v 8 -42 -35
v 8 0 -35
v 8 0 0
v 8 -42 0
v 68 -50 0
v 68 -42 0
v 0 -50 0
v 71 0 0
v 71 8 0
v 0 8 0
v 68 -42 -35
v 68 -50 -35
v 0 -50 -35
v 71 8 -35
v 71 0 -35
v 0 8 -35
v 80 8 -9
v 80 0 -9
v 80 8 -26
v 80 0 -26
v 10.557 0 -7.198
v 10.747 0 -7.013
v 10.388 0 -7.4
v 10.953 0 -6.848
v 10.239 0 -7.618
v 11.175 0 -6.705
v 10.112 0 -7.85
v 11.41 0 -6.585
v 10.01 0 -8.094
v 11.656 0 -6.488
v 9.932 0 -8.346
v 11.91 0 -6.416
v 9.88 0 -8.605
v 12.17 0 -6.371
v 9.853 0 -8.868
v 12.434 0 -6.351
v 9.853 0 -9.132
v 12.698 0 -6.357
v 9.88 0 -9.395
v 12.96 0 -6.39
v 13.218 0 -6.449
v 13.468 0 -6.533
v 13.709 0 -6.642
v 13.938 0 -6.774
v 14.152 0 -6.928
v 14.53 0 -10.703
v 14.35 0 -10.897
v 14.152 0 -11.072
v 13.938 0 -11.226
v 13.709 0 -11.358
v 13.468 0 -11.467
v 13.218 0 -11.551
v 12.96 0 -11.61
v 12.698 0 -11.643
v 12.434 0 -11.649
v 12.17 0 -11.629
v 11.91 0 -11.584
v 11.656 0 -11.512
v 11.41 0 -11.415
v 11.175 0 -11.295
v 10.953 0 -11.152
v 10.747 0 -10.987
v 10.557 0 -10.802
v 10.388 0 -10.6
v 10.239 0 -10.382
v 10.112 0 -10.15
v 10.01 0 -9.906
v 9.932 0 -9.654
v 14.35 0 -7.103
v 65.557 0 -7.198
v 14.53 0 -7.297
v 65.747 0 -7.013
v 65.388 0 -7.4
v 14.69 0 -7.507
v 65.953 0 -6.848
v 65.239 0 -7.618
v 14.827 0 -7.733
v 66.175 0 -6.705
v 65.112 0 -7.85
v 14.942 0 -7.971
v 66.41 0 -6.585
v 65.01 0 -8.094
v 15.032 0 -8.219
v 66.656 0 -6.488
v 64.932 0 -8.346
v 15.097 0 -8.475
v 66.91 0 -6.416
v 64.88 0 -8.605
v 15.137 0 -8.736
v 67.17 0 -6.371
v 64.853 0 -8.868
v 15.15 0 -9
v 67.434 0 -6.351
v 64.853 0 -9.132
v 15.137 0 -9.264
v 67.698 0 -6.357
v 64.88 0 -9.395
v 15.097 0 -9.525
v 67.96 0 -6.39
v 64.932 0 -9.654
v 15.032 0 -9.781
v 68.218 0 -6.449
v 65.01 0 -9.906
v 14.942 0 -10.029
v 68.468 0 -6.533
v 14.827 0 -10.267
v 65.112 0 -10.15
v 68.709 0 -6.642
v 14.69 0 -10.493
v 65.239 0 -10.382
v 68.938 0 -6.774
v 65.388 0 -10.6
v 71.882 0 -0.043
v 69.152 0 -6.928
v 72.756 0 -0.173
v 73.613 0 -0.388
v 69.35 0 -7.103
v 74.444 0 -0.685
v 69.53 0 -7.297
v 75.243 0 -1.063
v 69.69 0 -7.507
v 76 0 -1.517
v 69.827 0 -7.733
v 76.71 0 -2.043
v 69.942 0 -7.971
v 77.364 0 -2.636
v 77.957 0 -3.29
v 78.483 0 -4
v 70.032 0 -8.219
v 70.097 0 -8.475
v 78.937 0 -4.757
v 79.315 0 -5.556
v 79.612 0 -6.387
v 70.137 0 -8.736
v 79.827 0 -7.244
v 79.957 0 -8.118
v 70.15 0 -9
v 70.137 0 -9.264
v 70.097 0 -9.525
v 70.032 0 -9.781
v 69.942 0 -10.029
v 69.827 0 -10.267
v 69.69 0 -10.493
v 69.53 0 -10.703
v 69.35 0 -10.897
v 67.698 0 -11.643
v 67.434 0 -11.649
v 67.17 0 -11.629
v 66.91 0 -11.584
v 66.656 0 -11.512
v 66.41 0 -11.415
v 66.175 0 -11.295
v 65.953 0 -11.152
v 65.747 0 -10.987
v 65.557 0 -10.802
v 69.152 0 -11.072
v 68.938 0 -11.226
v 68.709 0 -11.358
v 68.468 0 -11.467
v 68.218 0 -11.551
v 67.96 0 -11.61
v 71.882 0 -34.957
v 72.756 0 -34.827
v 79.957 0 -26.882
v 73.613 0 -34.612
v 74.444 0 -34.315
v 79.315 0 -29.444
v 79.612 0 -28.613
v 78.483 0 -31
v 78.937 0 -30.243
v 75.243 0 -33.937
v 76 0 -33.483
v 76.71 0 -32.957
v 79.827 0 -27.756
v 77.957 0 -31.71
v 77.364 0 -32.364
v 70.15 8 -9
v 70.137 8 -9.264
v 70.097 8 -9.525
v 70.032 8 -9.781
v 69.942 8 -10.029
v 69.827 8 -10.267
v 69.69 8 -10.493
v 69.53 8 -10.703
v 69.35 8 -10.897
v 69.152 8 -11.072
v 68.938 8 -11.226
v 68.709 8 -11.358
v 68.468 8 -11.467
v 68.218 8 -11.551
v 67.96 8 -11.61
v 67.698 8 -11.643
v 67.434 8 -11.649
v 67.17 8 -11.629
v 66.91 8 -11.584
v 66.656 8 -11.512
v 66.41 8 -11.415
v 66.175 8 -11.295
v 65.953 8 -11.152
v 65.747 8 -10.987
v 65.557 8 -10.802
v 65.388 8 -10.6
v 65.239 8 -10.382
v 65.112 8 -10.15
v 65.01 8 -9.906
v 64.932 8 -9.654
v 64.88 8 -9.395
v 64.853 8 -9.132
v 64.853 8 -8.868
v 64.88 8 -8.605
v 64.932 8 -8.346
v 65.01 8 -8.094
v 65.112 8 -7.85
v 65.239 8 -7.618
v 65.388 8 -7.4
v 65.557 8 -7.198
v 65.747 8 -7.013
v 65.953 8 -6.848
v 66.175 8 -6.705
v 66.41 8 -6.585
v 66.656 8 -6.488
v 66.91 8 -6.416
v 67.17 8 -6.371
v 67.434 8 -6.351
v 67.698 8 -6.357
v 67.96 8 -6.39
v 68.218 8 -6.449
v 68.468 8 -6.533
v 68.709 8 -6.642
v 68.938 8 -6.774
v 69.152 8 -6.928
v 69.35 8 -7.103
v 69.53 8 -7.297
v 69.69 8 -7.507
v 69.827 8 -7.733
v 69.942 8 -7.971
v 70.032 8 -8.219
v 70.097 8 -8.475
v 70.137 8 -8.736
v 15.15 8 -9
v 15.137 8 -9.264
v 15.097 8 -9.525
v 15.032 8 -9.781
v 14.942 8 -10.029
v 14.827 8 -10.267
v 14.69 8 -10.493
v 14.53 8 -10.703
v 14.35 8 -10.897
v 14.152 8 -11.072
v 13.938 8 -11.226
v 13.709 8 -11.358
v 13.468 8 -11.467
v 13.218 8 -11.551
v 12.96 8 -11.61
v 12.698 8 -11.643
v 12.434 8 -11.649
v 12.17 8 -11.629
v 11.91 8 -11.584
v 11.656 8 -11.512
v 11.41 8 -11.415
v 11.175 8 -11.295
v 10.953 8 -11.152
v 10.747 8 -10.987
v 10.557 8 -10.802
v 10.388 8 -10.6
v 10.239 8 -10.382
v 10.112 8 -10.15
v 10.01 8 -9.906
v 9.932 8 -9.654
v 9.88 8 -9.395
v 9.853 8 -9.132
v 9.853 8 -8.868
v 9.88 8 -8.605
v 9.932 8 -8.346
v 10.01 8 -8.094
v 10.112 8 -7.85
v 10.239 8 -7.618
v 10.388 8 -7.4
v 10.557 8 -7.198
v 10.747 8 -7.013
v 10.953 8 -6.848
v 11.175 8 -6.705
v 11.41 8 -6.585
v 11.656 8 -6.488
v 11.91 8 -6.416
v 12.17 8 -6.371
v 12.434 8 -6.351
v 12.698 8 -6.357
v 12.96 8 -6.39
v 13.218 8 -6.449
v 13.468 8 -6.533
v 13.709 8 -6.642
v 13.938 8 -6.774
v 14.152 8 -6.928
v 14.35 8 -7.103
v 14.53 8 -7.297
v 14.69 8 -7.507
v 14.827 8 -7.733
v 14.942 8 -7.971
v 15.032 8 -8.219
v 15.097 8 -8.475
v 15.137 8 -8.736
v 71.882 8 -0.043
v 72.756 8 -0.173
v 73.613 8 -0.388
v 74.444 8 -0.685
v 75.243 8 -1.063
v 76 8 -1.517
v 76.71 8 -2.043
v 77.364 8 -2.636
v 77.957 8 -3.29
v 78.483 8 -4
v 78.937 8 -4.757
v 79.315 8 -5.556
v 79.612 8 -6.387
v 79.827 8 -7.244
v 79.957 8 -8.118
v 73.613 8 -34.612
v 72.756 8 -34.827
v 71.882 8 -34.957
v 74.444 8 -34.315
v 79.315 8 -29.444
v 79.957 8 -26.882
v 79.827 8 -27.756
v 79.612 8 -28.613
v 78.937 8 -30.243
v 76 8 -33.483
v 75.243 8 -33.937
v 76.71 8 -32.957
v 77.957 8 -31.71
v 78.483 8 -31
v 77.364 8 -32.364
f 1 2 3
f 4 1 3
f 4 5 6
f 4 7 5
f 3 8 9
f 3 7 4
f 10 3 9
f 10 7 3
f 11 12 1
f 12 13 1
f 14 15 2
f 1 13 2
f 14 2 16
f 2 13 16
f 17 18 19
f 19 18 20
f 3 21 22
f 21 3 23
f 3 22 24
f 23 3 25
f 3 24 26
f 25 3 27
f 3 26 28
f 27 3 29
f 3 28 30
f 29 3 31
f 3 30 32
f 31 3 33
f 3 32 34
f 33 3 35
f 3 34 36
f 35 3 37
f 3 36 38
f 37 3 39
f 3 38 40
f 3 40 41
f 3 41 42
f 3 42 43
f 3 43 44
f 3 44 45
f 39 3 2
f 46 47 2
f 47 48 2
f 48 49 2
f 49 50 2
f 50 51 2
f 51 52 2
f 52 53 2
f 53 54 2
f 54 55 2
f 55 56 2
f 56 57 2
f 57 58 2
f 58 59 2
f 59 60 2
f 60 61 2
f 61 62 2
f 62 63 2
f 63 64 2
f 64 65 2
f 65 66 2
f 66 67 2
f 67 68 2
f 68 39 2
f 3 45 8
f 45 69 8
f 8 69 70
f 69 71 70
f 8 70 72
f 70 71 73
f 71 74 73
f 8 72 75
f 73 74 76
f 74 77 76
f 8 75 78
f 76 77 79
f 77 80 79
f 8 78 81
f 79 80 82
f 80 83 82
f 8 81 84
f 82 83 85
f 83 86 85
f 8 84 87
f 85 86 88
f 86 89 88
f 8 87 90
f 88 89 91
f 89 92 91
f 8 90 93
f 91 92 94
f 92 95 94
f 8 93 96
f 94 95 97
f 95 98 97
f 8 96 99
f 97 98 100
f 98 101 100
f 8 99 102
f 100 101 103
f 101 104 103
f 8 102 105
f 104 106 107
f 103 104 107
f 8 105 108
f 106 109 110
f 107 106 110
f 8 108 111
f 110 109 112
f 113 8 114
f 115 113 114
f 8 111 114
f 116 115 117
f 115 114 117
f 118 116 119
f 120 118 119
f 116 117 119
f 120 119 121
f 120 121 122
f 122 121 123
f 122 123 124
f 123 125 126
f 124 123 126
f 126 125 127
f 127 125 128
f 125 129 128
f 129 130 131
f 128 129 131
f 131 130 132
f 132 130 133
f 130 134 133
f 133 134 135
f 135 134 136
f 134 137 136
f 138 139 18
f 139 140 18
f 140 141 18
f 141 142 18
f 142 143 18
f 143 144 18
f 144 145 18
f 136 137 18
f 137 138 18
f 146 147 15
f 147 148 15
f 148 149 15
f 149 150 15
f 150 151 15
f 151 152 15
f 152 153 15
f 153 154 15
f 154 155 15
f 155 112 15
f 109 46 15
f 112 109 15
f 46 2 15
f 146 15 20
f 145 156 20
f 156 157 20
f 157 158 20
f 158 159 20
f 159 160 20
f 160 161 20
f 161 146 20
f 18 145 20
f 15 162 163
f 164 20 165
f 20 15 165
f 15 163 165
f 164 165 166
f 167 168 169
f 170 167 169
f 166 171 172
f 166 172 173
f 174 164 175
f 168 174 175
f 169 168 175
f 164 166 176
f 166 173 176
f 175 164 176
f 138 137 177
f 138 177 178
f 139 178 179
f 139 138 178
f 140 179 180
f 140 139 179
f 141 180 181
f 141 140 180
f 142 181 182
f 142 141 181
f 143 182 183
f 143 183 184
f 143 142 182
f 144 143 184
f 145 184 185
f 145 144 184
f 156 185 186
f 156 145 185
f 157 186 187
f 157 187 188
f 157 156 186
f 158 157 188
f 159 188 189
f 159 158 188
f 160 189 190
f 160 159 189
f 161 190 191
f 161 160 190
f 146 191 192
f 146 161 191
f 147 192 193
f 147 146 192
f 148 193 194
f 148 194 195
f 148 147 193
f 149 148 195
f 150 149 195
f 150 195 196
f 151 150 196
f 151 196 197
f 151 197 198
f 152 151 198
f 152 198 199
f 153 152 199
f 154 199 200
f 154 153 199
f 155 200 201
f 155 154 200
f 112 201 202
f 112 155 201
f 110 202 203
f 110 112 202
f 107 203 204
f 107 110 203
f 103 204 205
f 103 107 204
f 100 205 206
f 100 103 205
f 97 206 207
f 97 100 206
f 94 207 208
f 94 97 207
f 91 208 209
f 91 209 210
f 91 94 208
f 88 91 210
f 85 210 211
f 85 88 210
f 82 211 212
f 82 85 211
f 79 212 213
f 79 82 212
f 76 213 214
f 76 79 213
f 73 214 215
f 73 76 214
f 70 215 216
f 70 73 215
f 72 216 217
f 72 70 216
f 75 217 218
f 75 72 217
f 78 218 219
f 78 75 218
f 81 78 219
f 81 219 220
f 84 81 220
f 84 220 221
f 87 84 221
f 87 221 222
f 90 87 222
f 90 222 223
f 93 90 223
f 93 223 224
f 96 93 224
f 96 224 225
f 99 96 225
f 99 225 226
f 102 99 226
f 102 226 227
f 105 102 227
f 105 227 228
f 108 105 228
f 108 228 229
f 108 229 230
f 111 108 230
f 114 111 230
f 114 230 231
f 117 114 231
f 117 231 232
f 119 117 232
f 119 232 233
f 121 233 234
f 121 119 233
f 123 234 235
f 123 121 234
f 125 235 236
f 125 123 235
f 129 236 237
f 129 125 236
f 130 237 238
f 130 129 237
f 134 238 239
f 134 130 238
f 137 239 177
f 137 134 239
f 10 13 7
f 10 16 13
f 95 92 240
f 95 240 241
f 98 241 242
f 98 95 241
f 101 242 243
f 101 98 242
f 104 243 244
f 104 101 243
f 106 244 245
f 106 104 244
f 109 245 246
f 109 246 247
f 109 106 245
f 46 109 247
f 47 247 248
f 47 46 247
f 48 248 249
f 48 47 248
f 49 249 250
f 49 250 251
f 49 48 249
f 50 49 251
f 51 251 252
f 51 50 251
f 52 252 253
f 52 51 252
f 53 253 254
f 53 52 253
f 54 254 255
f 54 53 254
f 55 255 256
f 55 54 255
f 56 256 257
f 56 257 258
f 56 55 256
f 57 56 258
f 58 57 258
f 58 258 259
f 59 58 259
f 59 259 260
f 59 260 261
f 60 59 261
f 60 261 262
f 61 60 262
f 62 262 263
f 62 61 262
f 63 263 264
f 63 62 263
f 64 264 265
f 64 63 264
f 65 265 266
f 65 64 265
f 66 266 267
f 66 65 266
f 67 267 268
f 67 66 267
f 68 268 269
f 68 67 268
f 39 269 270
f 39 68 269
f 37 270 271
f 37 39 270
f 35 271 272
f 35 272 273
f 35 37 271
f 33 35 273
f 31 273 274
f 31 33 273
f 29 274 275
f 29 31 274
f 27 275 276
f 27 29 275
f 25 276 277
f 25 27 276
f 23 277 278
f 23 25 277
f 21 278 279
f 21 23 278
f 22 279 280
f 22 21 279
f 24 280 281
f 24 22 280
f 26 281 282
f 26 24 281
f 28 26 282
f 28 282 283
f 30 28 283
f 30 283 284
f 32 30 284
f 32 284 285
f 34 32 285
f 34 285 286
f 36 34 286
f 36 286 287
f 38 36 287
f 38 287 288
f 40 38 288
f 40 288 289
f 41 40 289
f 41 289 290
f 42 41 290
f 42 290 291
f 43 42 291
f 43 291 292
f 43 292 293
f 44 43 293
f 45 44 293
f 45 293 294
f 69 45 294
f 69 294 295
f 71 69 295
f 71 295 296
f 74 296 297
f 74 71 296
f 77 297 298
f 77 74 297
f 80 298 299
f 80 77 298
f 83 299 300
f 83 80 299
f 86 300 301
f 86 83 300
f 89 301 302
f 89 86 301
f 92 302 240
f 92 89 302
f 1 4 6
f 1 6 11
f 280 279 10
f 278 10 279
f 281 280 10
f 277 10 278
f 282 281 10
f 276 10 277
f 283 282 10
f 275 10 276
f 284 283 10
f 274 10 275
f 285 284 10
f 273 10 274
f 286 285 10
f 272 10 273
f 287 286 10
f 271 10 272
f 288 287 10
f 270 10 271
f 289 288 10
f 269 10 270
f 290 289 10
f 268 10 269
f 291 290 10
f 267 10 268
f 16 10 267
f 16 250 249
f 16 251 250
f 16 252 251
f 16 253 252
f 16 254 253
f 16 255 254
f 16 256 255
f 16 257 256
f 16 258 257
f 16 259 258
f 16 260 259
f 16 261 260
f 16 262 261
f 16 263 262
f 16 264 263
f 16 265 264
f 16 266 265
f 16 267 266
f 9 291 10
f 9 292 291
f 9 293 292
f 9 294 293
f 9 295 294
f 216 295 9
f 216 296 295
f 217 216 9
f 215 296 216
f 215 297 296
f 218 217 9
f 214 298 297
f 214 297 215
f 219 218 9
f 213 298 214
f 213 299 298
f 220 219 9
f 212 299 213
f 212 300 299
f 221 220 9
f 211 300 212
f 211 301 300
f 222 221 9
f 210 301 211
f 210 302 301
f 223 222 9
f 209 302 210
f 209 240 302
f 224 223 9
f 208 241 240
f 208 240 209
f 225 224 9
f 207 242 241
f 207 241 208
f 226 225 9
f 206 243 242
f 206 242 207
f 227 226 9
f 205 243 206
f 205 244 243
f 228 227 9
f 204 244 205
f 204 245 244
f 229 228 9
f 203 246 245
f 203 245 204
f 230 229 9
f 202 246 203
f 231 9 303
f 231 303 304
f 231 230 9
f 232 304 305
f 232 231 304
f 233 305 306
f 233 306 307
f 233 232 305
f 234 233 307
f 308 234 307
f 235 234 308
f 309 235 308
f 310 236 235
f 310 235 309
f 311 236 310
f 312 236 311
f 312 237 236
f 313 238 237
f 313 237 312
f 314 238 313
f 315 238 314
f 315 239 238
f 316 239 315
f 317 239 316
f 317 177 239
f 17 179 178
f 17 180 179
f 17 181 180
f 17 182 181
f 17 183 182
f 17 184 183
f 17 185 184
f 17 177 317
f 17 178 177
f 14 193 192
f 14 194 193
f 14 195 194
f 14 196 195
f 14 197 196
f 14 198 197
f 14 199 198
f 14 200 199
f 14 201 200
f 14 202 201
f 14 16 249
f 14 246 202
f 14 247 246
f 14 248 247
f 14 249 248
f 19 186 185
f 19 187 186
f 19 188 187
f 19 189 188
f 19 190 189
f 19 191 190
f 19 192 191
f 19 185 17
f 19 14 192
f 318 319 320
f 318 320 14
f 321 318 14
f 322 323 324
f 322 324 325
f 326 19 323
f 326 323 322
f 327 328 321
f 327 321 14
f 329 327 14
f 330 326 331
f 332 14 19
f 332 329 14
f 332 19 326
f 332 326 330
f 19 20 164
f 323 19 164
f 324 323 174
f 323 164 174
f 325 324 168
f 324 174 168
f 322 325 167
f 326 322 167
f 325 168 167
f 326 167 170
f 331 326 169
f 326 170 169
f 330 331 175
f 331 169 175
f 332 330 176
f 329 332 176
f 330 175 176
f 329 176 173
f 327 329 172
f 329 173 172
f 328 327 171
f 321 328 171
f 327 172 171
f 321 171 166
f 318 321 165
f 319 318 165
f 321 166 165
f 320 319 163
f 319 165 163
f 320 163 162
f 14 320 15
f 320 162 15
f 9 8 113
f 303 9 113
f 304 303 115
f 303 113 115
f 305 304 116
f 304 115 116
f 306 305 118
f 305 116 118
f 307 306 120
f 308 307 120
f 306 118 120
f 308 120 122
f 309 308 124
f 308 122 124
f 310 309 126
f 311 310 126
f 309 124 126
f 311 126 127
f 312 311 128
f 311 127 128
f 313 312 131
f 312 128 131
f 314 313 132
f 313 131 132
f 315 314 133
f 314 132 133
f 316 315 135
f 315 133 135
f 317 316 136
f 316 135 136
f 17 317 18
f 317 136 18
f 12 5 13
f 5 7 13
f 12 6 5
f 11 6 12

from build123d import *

# Parameters (mm, degrees)
SKETCH1_R           = 2.65
BOSS_EXTRUDE1_DEPTH = 8
SKETCH2_W           = 8
SKETCH2_H           = 35
BOSS_EXTRUDE2_DEPTH = 50
SKETCH3_W           = 35
SKETCH3_H           = 8
BOSS_EXTRUDE3_DEPTH = 60


with BuildPart() as part:
    # Sketch1 → Boss-Extrude1 (new body)
    with BuildSketch(Plane(origin=(0, 0, 0), x_dir=(1, 0, 0), z_dir=(0, 1, 0))):
        with BuildLine():
            Line((0, 0), (71, 0))
            ThreePointArc((71, 0), (77.363961031, 2.636038969), (80, 9))
            Line((80, 9), (80, 26))
            ThreePointArc((80, 26), (77.363961031, 32.363961031), (71, 35))
            Line((71, 35), (0, 35))
            Line((0, 35), (0, 0))
        make_face()
        with Locations((12.5, 9)):
            Circle(SKETCH1_R, mode=Mode.SUBTRACT)
        with Locations((67.5, 9)):
            Circle(SKETCH1_R, mode=Mode.SUBTRACT)
    extrude(amount=BOSS_EXTRUDE1_DEPTH)

    # Sketch2 → Boss-Extrude2 (add)
    with BuildSketch(Plane.XZ):
        with Locations((4, -17.5)):
            Rectangle(SKETCH2_W, SKETCH2_H)
    extrude(amount=BOSS_EXTRUDE2_DEPTH)

    # Sketch3 → Boss-Extrude3 (add)
    with BuildSketch(Plane(origin=(8, 0, 0), x_dir=(0, 0, -1), z_dir=(1, 0, 0))):
        with Locations((17.5, -46)):
            Rectangle(SKETCH3_W, SKETCH3_H)
    extrude(amount=BOSS_EXTRUDE3_DEPTH)


solid = part.part
